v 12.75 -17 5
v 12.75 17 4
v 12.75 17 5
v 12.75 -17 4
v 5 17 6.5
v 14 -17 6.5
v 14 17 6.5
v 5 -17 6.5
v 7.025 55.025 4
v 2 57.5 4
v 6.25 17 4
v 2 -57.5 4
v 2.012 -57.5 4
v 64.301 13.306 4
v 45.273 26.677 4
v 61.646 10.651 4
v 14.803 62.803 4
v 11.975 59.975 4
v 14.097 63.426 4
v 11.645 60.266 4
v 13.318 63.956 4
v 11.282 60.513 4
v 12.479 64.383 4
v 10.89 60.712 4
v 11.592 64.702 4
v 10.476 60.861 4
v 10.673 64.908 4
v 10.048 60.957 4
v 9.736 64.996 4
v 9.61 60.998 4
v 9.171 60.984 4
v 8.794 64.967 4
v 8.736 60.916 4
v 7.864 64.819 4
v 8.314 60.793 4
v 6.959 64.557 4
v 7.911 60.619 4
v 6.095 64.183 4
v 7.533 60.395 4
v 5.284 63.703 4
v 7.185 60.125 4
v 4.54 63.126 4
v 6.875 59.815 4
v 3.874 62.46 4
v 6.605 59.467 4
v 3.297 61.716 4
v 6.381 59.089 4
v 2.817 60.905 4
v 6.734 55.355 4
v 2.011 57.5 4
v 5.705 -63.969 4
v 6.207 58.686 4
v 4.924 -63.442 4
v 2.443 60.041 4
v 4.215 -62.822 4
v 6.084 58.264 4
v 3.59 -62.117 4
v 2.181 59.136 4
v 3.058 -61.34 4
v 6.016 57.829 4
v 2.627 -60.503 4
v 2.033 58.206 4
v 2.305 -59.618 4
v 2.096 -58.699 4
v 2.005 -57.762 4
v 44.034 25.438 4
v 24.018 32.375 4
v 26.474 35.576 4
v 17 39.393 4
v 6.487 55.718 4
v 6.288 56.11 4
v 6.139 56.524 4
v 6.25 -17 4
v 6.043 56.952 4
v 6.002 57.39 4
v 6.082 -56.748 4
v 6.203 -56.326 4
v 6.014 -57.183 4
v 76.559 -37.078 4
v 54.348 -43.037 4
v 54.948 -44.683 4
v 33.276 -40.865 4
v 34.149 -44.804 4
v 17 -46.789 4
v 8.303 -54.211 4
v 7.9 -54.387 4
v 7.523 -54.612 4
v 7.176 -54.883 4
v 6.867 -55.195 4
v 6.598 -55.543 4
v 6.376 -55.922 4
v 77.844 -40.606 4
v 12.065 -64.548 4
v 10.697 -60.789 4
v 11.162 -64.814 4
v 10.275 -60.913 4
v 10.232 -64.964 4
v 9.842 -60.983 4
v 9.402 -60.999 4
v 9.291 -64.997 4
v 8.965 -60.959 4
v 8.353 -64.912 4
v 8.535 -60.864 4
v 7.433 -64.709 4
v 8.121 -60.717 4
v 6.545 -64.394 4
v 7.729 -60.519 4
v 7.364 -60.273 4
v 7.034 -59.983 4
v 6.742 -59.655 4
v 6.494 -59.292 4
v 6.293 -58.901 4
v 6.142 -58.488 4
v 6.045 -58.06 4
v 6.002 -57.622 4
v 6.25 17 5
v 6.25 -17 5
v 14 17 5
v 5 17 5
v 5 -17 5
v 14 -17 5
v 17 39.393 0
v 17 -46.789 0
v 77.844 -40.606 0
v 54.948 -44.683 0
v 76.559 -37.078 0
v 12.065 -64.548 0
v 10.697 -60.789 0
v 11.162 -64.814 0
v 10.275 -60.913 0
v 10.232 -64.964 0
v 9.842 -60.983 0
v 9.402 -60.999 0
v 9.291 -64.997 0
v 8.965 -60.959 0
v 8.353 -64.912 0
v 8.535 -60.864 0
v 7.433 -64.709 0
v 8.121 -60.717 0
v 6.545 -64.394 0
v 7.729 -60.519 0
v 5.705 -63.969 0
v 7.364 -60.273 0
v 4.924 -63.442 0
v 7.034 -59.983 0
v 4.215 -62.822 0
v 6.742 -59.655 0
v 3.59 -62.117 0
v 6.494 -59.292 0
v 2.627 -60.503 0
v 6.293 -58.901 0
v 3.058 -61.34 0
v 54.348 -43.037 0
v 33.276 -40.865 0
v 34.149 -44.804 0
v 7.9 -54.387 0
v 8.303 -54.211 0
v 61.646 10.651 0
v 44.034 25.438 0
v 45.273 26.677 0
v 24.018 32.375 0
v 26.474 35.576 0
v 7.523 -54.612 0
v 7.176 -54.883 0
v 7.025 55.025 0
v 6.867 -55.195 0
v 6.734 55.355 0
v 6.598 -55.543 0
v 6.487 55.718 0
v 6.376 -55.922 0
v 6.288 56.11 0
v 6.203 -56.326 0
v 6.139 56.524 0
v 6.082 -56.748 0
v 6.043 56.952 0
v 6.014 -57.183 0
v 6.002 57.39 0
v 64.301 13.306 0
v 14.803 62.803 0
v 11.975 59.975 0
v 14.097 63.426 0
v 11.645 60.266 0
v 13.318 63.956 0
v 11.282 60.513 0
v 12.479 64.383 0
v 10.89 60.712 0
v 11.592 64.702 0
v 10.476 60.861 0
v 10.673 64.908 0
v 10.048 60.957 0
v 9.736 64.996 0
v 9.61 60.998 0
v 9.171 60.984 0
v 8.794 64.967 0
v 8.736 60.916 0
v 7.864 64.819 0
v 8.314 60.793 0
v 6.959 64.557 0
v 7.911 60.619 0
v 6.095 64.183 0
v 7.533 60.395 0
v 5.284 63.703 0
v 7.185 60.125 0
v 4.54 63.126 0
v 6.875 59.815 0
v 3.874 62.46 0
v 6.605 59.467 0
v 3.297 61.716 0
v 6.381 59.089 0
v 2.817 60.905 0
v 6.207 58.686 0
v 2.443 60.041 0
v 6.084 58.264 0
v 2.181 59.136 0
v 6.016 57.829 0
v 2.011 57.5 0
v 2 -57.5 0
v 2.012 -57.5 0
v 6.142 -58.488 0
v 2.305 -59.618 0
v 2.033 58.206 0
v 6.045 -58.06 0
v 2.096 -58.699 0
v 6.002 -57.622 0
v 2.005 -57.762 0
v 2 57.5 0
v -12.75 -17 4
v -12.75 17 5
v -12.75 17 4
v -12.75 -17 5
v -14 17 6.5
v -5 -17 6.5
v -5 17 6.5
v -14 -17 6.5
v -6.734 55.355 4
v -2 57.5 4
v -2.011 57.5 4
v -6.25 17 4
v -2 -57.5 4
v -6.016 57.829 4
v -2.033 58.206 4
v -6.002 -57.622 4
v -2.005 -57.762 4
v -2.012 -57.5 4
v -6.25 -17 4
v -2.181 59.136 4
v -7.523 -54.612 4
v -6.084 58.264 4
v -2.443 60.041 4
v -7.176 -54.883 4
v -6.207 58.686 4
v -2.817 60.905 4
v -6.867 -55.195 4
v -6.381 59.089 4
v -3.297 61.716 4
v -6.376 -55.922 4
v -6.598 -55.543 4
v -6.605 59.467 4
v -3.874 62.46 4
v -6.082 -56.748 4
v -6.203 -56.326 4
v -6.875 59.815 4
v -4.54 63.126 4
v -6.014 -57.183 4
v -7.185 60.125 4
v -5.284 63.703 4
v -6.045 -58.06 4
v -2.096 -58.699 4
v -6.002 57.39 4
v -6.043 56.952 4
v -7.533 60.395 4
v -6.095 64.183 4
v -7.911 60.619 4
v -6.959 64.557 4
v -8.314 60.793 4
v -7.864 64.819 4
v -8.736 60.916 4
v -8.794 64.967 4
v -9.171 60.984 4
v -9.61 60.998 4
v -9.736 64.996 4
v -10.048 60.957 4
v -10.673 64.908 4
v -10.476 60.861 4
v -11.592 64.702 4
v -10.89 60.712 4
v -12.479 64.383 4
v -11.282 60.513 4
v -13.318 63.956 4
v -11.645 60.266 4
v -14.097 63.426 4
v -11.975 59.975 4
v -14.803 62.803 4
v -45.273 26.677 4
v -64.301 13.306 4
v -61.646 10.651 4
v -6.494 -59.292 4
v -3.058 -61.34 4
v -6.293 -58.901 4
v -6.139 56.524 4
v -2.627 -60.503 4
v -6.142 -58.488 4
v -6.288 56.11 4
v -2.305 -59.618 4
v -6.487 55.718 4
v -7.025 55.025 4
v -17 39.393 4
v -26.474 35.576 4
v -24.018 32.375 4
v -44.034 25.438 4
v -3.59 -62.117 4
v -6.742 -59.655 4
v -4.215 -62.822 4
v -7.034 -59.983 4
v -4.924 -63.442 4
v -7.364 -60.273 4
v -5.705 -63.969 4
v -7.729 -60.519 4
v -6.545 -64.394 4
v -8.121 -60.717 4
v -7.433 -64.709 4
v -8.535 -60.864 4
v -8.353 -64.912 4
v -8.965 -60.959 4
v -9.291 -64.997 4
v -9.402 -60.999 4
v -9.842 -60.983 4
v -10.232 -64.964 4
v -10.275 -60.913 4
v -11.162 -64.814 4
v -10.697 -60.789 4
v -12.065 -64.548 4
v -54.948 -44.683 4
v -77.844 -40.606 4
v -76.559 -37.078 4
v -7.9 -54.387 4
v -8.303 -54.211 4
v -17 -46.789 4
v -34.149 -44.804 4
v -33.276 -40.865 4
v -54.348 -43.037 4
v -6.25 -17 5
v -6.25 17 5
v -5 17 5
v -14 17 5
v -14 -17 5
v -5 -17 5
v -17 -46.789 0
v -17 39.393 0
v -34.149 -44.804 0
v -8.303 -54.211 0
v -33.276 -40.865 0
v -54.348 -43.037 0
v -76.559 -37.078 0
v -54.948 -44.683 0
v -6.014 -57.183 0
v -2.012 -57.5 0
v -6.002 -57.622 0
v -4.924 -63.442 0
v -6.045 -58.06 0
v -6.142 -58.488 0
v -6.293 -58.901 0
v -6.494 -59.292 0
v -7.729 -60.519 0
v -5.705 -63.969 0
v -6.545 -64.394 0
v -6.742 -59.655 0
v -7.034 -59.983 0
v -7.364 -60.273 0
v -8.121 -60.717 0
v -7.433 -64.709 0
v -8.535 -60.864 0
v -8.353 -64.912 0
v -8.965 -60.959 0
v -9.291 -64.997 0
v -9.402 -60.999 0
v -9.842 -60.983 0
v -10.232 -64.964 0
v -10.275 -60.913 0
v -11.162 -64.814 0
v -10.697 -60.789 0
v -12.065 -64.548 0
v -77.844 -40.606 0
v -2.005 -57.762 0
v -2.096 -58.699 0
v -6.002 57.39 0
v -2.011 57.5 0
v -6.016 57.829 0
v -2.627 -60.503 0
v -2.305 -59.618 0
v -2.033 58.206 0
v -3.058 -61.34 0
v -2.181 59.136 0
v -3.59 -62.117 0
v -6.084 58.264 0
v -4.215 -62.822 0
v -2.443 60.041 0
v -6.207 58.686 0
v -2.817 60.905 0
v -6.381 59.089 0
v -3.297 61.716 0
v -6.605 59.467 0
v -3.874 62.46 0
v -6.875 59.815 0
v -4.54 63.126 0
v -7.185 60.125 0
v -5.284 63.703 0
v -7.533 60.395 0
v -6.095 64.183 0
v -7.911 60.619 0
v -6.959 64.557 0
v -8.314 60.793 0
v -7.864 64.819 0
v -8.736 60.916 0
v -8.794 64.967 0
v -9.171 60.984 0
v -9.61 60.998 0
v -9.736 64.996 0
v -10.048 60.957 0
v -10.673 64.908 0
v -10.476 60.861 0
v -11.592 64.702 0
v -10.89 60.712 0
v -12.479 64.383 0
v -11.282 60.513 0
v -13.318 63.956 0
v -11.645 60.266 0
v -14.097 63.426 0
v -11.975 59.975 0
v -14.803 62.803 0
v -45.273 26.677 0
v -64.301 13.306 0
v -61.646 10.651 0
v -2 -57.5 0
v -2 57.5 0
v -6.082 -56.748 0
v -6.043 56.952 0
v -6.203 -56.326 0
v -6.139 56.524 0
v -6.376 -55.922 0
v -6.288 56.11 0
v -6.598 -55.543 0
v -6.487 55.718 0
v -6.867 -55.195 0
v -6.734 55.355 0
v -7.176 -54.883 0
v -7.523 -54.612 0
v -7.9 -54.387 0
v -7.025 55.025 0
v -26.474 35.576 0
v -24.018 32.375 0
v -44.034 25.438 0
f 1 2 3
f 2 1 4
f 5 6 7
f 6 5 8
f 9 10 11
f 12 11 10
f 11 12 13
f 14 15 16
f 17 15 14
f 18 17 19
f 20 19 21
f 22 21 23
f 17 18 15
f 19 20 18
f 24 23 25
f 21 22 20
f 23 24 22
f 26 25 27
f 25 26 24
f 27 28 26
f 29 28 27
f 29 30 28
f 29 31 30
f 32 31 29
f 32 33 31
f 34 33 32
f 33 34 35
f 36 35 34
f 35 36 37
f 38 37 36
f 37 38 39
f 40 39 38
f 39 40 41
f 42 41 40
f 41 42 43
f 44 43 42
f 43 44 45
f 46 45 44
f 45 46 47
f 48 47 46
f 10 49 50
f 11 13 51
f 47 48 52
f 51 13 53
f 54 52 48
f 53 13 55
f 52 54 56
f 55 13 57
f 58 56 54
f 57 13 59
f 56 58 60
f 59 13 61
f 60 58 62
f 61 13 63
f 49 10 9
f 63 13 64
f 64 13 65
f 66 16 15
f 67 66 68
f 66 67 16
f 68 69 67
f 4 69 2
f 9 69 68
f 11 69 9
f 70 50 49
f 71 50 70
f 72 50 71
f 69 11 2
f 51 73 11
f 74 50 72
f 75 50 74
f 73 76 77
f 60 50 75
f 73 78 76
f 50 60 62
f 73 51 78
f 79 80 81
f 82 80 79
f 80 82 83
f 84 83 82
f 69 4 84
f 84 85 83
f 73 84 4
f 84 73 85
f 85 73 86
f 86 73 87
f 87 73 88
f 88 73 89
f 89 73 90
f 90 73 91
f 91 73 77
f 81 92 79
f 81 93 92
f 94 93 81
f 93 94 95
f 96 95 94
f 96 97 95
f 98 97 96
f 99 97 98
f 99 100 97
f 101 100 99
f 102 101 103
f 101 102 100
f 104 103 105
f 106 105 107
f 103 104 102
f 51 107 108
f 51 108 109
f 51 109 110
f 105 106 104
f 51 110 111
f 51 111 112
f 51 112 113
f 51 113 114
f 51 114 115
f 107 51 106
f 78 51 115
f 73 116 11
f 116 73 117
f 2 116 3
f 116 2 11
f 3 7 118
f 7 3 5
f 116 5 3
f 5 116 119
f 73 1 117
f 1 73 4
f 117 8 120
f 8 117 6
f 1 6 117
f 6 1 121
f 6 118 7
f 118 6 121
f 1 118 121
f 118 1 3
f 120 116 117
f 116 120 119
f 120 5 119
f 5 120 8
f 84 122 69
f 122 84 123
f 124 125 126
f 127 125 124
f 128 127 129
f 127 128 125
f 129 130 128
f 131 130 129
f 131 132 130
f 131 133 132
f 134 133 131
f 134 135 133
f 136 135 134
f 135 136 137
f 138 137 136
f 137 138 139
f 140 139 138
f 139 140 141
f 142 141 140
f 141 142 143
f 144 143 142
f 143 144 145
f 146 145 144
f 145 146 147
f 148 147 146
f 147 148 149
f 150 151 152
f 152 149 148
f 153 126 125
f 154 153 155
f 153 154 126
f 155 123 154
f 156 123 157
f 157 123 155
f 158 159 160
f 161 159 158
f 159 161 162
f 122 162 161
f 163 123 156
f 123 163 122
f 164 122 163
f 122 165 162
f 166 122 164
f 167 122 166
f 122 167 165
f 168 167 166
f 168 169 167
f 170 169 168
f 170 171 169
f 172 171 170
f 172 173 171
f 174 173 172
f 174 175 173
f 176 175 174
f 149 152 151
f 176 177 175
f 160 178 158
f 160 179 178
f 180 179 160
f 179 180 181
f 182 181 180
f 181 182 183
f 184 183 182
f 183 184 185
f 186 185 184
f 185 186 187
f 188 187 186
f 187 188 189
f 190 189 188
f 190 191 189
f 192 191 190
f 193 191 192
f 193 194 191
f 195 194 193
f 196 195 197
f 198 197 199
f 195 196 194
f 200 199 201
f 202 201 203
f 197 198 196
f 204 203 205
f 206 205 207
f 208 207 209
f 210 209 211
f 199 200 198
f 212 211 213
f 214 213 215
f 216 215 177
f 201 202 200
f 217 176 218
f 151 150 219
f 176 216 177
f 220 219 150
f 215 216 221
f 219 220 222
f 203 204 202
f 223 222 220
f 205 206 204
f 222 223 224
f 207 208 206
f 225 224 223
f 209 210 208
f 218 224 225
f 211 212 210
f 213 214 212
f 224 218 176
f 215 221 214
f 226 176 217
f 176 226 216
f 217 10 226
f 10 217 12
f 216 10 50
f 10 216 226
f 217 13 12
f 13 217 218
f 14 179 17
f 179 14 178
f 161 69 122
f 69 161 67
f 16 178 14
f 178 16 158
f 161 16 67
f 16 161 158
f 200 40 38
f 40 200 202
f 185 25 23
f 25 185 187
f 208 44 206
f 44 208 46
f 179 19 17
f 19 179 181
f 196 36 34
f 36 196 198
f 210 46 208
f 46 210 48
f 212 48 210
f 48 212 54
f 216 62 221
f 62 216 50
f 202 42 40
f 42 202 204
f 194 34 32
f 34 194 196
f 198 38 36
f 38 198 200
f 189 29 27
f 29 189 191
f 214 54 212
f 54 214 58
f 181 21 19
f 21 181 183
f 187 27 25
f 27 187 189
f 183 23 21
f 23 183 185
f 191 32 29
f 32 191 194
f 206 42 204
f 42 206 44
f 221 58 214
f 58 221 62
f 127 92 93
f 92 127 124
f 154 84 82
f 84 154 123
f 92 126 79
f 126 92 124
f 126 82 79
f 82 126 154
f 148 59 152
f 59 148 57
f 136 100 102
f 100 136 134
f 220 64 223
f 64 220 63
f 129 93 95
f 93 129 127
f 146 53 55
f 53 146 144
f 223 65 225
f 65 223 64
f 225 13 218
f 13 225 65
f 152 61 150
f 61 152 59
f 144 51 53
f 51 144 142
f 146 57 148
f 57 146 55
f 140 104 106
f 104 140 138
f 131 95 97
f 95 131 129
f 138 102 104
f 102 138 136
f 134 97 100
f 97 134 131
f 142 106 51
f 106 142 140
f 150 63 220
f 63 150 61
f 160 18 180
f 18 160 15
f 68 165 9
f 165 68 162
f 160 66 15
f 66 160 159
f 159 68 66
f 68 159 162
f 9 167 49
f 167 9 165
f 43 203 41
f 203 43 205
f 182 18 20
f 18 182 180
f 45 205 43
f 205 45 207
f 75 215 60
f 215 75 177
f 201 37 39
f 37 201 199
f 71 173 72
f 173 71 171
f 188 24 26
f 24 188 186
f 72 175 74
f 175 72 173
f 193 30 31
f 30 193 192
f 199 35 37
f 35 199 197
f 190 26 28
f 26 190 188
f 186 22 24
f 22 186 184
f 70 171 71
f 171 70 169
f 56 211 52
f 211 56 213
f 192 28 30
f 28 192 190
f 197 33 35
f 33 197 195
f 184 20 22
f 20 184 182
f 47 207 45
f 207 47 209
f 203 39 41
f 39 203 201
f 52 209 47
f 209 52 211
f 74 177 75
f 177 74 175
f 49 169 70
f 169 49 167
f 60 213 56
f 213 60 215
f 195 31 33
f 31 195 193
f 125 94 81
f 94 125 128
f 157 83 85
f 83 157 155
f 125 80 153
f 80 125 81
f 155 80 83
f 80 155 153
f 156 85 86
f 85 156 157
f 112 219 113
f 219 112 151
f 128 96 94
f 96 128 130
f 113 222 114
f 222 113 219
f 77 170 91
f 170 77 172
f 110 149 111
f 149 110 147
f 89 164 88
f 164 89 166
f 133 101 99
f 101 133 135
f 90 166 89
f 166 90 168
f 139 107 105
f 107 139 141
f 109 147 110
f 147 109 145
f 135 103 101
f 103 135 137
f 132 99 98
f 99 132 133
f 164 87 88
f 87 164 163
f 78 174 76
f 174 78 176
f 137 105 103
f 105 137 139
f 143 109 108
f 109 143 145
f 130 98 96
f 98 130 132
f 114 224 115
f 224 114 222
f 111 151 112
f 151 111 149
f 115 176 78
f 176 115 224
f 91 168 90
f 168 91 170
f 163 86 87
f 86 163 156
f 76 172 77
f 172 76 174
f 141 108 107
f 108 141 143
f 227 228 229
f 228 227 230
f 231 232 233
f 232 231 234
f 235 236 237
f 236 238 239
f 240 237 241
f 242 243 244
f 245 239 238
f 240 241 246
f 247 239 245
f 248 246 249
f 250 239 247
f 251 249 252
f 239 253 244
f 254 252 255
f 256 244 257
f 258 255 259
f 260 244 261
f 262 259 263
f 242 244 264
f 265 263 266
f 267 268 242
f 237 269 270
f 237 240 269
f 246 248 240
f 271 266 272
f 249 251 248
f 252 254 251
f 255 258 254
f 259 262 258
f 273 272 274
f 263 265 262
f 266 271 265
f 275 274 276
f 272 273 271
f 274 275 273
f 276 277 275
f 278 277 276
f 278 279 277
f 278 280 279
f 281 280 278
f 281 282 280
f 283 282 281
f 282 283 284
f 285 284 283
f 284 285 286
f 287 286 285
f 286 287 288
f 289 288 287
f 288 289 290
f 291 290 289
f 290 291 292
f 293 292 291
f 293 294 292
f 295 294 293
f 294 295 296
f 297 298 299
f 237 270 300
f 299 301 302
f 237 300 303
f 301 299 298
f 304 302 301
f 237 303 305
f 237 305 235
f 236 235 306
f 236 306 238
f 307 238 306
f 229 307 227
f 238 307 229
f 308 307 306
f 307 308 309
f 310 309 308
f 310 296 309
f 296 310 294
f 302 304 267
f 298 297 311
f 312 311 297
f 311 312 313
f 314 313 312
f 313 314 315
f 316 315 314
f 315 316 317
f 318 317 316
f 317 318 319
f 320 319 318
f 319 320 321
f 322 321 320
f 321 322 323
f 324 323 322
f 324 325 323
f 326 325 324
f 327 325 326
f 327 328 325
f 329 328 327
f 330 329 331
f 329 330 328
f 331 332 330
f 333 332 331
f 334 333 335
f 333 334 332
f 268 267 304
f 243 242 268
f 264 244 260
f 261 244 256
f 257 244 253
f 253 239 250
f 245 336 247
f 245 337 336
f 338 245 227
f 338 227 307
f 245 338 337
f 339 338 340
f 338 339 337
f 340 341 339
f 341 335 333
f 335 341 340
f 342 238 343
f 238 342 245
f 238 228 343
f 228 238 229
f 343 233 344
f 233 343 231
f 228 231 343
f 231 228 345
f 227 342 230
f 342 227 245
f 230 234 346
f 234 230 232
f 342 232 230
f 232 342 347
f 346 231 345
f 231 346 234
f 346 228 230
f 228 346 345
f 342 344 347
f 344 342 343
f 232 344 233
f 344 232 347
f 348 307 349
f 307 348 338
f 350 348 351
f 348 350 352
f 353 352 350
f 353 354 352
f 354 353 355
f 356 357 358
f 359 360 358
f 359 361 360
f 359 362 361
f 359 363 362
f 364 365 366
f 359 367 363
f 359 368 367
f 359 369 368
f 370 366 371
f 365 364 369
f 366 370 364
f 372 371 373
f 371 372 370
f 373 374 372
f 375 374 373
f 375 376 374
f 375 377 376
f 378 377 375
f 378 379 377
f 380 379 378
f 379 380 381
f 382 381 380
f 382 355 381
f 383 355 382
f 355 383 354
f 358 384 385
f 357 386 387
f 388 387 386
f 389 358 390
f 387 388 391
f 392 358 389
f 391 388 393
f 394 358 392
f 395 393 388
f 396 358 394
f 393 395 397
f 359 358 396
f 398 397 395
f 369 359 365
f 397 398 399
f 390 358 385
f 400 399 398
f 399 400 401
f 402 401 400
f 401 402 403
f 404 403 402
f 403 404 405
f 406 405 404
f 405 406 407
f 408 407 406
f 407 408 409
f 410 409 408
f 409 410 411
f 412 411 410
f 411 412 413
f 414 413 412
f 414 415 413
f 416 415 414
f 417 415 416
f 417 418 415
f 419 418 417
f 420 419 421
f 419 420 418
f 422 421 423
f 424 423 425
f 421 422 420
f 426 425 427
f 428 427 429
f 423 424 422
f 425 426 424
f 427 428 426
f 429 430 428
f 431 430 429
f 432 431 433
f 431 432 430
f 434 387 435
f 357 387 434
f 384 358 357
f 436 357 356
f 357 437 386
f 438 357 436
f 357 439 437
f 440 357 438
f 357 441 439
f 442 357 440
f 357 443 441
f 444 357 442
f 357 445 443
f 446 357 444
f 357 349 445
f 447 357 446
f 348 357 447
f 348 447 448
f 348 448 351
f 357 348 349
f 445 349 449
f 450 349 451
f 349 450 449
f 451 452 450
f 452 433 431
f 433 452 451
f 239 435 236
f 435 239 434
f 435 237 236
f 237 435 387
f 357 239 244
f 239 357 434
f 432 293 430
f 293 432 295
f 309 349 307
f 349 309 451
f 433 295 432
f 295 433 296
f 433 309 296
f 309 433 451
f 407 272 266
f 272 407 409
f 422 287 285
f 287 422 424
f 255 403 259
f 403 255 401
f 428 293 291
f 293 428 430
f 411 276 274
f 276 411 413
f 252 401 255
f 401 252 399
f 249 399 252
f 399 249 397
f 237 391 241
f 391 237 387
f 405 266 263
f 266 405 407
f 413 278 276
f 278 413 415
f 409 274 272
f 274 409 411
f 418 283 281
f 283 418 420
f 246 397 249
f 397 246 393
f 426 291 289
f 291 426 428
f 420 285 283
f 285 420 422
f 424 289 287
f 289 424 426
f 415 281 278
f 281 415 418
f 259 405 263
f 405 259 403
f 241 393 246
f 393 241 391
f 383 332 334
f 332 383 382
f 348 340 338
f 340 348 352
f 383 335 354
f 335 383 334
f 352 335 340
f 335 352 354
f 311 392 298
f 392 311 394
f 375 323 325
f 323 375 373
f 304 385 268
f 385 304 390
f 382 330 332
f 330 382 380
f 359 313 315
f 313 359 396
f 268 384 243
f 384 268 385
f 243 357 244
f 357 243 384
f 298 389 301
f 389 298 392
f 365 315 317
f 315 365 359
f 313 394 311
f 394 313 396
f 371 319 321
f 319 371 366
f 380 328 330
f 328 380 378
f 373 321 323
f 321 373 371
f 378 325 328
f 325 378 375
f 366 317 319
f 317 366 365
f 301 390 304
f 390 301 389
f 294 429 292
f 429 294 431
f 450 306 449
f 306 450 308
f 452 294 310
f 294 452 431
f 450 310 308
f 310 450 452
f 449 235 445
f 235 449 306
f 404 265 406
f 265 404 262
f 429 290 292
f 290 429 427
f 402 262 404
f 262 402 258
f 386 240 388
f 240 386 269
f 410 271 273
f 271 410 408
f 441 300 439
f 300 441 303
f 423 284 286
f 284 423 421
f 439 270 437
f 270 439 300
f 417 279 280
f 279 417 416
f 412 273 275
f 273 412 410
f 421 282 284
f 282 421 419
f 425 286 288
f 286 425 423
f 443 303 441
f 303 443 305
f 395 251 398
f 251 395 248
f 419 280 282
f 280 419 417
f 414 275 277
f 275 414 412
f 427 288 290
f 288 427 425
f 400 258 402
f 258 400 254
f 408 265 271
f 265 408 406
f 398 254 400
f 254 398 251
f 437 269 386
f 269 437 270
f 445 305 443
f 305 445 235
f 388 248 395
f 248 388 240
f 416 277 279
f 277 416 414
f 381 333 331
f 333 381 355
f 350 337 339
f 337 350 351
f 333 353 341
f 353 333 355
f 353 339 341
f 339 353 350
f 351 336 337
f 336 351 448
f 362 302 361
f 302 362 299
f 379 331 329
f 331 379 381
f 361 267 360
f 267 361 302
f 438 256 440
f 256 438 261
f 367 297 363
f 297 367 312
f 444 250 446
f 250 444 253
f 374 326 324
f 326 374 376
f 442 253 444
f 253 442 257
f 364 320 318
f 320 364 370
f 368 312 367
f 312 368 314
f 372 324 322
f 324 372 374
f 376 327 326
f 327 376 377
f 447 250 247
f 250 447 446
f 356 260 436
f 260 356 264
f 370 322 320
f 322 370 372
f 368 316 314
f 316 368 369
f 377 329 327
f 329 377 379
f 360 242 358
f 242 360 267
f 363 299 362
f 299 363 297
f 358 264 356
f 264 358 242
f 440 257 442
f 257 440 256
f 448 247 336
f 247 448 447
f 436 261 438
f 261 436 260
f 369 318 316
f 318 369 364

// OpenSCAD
$fn = 50;
/*[Nintendo Switch Support bracket parameters]*/
// (mm) Printed thickness of the bracket support beams (not including rail)
thickness = 4;
// (mm) Width of the support beams
beamwidth = 15;
// (mm) Length of the main beam
beamlength = 130;
// Angle of the top bracket
topangle = 45;
// Angle of the bottom bracket
bottomangle = 70;
// (0/!0) Include supports for bridging (omit these if you can reliably print support structures or use a support material with your slicer/printer)
supports = 0;

dual_switch_supports(thickness, beamwidth, beamlength, topangle, bottomangle, supports);

// Mount rail to fit the Nintendo Switch joystick keyway
module Joyrail(s, l)
{
	w = 9;
	//l = 50;
	h = 2.5;
	t = 1.5;
	gap = 1.0;
	key = h - gap;
	//translate([0,0,(h/4) + (h/2)])
	union() {
		translate([0,0,h/2])	// main support
			cube([w-h, l, h], true);
		translate([0,0,h - (key/2)])	// key plate
			cube([w, l, key], true);
		if(s != 0)
		{
			// Some little support blocks that should be bridgable on most printers
			translate([0,-(l - t)/2,h/2])	// end supports
				cube([w, t, h], true);
			translate([0, (l - t)/2,h/2])
				cube([w, t, h], true);
		}
	}
}

// Main bar of the support
module Bar(thickness, length, width, keylen, printsupports)
{
	w = width;
	h = thickness;
	l = length;
	translate([0,0,h/2])
		cube([w, l, h], true);
	translate([0,0, h])
		Joyrail(printsupports, keylen);
}

// A nicely shaped bar that makes up the feet of the support bracket (or an appropriate punchout)
module SupportBar(thickness, length, width, clipangle)
{
  w = width;
	h = thickness;
	l = length;
	
	//clipangle = 15;//atan(4.5/14);
	offset = width;
	cliplen = l * 1.5;
	union()
	{
		difference()
		{

			cube([w, l, h], true);

			translate([0, (l/2) + offset , 0])
				rotate([0,0,-clipangle])
					translate([0, -cliplen/2, 0])
						cube([w, cliplen, h+1], true);
		}
		translate([0, -length/2, 0])
			cylinder(h = thickness, d = width, center = true);
  }
}

// Pattern to make up a single support bracket (mirror it for the other side)
module SwitchSupport(thickness, barwidth, barlength, topangle, bottomangle, printsupports)
{
	length = barlength - barwidth;
	feet = 70;
	top = topangle;
	bottom = bottomangle;
	width = barwidth;
	clipangle = 15;
	punchdiff = 2 * ((thickness / sin(clipangle)) - (thickness));
	keylen = 2* (82 - (barlength / 2));
	difference()
	{
		union()
		{
			// mounting beam
			Bar(thickness, length, width, keylen, printsupports);
	
			// top foot
			translate([0, length/2, thickness/2])
				rotate([0,0,top])
					translate([0, -feet/2,0])
						mirror([0,1,0])
							SupportBar(thickness, feet, width, clipangle);
			// bottom foot
			translate([0, -length/2, thickness/2])
				rotate([0,0, 360 - bottom])
					translate([0, feet/2,0])
						SupportBar(thickness, feet, width, clipangle);
    }

		// punchouts
			translate([0, length/2, thickness/2])
				rotate([0,0,top])
					translate([0, -feet/2,0])
						mirror([0,1,0])
							translate([0, -(punchdiff)/2, 0])
								SupportBar(thickness + 1, feet - punchdiff, width - (thickness * 2), clipangle);


			translate([0, -length/2, thickness/2])
				rotate([0,0, 360 - bottom])
					translate([0, feet/2,0])
						translate([0, -(punchdiff)/2, 0])
							SupportBar(thickness + 1, feet - punchdiff, width - (thickness * 2), clipangle);
  }
}

// A pair of matched support brackets
module dual_switch_supports(thickness, barwidth, barlength, topangle, bottomangle, printsupports)
{
translate([ ((barwidth / 2) + 2),0,0])
	SwitchSupport(thickness, barwidth, barlength, topangle, bottomangle, printsupports);
translate([-((barwidth / 2) + 2),0,0])
	mirror([1,0,0])
		SwitchSupport(thickness, barwidth, barlength, topangle, bottomangle, printsupports);
}
